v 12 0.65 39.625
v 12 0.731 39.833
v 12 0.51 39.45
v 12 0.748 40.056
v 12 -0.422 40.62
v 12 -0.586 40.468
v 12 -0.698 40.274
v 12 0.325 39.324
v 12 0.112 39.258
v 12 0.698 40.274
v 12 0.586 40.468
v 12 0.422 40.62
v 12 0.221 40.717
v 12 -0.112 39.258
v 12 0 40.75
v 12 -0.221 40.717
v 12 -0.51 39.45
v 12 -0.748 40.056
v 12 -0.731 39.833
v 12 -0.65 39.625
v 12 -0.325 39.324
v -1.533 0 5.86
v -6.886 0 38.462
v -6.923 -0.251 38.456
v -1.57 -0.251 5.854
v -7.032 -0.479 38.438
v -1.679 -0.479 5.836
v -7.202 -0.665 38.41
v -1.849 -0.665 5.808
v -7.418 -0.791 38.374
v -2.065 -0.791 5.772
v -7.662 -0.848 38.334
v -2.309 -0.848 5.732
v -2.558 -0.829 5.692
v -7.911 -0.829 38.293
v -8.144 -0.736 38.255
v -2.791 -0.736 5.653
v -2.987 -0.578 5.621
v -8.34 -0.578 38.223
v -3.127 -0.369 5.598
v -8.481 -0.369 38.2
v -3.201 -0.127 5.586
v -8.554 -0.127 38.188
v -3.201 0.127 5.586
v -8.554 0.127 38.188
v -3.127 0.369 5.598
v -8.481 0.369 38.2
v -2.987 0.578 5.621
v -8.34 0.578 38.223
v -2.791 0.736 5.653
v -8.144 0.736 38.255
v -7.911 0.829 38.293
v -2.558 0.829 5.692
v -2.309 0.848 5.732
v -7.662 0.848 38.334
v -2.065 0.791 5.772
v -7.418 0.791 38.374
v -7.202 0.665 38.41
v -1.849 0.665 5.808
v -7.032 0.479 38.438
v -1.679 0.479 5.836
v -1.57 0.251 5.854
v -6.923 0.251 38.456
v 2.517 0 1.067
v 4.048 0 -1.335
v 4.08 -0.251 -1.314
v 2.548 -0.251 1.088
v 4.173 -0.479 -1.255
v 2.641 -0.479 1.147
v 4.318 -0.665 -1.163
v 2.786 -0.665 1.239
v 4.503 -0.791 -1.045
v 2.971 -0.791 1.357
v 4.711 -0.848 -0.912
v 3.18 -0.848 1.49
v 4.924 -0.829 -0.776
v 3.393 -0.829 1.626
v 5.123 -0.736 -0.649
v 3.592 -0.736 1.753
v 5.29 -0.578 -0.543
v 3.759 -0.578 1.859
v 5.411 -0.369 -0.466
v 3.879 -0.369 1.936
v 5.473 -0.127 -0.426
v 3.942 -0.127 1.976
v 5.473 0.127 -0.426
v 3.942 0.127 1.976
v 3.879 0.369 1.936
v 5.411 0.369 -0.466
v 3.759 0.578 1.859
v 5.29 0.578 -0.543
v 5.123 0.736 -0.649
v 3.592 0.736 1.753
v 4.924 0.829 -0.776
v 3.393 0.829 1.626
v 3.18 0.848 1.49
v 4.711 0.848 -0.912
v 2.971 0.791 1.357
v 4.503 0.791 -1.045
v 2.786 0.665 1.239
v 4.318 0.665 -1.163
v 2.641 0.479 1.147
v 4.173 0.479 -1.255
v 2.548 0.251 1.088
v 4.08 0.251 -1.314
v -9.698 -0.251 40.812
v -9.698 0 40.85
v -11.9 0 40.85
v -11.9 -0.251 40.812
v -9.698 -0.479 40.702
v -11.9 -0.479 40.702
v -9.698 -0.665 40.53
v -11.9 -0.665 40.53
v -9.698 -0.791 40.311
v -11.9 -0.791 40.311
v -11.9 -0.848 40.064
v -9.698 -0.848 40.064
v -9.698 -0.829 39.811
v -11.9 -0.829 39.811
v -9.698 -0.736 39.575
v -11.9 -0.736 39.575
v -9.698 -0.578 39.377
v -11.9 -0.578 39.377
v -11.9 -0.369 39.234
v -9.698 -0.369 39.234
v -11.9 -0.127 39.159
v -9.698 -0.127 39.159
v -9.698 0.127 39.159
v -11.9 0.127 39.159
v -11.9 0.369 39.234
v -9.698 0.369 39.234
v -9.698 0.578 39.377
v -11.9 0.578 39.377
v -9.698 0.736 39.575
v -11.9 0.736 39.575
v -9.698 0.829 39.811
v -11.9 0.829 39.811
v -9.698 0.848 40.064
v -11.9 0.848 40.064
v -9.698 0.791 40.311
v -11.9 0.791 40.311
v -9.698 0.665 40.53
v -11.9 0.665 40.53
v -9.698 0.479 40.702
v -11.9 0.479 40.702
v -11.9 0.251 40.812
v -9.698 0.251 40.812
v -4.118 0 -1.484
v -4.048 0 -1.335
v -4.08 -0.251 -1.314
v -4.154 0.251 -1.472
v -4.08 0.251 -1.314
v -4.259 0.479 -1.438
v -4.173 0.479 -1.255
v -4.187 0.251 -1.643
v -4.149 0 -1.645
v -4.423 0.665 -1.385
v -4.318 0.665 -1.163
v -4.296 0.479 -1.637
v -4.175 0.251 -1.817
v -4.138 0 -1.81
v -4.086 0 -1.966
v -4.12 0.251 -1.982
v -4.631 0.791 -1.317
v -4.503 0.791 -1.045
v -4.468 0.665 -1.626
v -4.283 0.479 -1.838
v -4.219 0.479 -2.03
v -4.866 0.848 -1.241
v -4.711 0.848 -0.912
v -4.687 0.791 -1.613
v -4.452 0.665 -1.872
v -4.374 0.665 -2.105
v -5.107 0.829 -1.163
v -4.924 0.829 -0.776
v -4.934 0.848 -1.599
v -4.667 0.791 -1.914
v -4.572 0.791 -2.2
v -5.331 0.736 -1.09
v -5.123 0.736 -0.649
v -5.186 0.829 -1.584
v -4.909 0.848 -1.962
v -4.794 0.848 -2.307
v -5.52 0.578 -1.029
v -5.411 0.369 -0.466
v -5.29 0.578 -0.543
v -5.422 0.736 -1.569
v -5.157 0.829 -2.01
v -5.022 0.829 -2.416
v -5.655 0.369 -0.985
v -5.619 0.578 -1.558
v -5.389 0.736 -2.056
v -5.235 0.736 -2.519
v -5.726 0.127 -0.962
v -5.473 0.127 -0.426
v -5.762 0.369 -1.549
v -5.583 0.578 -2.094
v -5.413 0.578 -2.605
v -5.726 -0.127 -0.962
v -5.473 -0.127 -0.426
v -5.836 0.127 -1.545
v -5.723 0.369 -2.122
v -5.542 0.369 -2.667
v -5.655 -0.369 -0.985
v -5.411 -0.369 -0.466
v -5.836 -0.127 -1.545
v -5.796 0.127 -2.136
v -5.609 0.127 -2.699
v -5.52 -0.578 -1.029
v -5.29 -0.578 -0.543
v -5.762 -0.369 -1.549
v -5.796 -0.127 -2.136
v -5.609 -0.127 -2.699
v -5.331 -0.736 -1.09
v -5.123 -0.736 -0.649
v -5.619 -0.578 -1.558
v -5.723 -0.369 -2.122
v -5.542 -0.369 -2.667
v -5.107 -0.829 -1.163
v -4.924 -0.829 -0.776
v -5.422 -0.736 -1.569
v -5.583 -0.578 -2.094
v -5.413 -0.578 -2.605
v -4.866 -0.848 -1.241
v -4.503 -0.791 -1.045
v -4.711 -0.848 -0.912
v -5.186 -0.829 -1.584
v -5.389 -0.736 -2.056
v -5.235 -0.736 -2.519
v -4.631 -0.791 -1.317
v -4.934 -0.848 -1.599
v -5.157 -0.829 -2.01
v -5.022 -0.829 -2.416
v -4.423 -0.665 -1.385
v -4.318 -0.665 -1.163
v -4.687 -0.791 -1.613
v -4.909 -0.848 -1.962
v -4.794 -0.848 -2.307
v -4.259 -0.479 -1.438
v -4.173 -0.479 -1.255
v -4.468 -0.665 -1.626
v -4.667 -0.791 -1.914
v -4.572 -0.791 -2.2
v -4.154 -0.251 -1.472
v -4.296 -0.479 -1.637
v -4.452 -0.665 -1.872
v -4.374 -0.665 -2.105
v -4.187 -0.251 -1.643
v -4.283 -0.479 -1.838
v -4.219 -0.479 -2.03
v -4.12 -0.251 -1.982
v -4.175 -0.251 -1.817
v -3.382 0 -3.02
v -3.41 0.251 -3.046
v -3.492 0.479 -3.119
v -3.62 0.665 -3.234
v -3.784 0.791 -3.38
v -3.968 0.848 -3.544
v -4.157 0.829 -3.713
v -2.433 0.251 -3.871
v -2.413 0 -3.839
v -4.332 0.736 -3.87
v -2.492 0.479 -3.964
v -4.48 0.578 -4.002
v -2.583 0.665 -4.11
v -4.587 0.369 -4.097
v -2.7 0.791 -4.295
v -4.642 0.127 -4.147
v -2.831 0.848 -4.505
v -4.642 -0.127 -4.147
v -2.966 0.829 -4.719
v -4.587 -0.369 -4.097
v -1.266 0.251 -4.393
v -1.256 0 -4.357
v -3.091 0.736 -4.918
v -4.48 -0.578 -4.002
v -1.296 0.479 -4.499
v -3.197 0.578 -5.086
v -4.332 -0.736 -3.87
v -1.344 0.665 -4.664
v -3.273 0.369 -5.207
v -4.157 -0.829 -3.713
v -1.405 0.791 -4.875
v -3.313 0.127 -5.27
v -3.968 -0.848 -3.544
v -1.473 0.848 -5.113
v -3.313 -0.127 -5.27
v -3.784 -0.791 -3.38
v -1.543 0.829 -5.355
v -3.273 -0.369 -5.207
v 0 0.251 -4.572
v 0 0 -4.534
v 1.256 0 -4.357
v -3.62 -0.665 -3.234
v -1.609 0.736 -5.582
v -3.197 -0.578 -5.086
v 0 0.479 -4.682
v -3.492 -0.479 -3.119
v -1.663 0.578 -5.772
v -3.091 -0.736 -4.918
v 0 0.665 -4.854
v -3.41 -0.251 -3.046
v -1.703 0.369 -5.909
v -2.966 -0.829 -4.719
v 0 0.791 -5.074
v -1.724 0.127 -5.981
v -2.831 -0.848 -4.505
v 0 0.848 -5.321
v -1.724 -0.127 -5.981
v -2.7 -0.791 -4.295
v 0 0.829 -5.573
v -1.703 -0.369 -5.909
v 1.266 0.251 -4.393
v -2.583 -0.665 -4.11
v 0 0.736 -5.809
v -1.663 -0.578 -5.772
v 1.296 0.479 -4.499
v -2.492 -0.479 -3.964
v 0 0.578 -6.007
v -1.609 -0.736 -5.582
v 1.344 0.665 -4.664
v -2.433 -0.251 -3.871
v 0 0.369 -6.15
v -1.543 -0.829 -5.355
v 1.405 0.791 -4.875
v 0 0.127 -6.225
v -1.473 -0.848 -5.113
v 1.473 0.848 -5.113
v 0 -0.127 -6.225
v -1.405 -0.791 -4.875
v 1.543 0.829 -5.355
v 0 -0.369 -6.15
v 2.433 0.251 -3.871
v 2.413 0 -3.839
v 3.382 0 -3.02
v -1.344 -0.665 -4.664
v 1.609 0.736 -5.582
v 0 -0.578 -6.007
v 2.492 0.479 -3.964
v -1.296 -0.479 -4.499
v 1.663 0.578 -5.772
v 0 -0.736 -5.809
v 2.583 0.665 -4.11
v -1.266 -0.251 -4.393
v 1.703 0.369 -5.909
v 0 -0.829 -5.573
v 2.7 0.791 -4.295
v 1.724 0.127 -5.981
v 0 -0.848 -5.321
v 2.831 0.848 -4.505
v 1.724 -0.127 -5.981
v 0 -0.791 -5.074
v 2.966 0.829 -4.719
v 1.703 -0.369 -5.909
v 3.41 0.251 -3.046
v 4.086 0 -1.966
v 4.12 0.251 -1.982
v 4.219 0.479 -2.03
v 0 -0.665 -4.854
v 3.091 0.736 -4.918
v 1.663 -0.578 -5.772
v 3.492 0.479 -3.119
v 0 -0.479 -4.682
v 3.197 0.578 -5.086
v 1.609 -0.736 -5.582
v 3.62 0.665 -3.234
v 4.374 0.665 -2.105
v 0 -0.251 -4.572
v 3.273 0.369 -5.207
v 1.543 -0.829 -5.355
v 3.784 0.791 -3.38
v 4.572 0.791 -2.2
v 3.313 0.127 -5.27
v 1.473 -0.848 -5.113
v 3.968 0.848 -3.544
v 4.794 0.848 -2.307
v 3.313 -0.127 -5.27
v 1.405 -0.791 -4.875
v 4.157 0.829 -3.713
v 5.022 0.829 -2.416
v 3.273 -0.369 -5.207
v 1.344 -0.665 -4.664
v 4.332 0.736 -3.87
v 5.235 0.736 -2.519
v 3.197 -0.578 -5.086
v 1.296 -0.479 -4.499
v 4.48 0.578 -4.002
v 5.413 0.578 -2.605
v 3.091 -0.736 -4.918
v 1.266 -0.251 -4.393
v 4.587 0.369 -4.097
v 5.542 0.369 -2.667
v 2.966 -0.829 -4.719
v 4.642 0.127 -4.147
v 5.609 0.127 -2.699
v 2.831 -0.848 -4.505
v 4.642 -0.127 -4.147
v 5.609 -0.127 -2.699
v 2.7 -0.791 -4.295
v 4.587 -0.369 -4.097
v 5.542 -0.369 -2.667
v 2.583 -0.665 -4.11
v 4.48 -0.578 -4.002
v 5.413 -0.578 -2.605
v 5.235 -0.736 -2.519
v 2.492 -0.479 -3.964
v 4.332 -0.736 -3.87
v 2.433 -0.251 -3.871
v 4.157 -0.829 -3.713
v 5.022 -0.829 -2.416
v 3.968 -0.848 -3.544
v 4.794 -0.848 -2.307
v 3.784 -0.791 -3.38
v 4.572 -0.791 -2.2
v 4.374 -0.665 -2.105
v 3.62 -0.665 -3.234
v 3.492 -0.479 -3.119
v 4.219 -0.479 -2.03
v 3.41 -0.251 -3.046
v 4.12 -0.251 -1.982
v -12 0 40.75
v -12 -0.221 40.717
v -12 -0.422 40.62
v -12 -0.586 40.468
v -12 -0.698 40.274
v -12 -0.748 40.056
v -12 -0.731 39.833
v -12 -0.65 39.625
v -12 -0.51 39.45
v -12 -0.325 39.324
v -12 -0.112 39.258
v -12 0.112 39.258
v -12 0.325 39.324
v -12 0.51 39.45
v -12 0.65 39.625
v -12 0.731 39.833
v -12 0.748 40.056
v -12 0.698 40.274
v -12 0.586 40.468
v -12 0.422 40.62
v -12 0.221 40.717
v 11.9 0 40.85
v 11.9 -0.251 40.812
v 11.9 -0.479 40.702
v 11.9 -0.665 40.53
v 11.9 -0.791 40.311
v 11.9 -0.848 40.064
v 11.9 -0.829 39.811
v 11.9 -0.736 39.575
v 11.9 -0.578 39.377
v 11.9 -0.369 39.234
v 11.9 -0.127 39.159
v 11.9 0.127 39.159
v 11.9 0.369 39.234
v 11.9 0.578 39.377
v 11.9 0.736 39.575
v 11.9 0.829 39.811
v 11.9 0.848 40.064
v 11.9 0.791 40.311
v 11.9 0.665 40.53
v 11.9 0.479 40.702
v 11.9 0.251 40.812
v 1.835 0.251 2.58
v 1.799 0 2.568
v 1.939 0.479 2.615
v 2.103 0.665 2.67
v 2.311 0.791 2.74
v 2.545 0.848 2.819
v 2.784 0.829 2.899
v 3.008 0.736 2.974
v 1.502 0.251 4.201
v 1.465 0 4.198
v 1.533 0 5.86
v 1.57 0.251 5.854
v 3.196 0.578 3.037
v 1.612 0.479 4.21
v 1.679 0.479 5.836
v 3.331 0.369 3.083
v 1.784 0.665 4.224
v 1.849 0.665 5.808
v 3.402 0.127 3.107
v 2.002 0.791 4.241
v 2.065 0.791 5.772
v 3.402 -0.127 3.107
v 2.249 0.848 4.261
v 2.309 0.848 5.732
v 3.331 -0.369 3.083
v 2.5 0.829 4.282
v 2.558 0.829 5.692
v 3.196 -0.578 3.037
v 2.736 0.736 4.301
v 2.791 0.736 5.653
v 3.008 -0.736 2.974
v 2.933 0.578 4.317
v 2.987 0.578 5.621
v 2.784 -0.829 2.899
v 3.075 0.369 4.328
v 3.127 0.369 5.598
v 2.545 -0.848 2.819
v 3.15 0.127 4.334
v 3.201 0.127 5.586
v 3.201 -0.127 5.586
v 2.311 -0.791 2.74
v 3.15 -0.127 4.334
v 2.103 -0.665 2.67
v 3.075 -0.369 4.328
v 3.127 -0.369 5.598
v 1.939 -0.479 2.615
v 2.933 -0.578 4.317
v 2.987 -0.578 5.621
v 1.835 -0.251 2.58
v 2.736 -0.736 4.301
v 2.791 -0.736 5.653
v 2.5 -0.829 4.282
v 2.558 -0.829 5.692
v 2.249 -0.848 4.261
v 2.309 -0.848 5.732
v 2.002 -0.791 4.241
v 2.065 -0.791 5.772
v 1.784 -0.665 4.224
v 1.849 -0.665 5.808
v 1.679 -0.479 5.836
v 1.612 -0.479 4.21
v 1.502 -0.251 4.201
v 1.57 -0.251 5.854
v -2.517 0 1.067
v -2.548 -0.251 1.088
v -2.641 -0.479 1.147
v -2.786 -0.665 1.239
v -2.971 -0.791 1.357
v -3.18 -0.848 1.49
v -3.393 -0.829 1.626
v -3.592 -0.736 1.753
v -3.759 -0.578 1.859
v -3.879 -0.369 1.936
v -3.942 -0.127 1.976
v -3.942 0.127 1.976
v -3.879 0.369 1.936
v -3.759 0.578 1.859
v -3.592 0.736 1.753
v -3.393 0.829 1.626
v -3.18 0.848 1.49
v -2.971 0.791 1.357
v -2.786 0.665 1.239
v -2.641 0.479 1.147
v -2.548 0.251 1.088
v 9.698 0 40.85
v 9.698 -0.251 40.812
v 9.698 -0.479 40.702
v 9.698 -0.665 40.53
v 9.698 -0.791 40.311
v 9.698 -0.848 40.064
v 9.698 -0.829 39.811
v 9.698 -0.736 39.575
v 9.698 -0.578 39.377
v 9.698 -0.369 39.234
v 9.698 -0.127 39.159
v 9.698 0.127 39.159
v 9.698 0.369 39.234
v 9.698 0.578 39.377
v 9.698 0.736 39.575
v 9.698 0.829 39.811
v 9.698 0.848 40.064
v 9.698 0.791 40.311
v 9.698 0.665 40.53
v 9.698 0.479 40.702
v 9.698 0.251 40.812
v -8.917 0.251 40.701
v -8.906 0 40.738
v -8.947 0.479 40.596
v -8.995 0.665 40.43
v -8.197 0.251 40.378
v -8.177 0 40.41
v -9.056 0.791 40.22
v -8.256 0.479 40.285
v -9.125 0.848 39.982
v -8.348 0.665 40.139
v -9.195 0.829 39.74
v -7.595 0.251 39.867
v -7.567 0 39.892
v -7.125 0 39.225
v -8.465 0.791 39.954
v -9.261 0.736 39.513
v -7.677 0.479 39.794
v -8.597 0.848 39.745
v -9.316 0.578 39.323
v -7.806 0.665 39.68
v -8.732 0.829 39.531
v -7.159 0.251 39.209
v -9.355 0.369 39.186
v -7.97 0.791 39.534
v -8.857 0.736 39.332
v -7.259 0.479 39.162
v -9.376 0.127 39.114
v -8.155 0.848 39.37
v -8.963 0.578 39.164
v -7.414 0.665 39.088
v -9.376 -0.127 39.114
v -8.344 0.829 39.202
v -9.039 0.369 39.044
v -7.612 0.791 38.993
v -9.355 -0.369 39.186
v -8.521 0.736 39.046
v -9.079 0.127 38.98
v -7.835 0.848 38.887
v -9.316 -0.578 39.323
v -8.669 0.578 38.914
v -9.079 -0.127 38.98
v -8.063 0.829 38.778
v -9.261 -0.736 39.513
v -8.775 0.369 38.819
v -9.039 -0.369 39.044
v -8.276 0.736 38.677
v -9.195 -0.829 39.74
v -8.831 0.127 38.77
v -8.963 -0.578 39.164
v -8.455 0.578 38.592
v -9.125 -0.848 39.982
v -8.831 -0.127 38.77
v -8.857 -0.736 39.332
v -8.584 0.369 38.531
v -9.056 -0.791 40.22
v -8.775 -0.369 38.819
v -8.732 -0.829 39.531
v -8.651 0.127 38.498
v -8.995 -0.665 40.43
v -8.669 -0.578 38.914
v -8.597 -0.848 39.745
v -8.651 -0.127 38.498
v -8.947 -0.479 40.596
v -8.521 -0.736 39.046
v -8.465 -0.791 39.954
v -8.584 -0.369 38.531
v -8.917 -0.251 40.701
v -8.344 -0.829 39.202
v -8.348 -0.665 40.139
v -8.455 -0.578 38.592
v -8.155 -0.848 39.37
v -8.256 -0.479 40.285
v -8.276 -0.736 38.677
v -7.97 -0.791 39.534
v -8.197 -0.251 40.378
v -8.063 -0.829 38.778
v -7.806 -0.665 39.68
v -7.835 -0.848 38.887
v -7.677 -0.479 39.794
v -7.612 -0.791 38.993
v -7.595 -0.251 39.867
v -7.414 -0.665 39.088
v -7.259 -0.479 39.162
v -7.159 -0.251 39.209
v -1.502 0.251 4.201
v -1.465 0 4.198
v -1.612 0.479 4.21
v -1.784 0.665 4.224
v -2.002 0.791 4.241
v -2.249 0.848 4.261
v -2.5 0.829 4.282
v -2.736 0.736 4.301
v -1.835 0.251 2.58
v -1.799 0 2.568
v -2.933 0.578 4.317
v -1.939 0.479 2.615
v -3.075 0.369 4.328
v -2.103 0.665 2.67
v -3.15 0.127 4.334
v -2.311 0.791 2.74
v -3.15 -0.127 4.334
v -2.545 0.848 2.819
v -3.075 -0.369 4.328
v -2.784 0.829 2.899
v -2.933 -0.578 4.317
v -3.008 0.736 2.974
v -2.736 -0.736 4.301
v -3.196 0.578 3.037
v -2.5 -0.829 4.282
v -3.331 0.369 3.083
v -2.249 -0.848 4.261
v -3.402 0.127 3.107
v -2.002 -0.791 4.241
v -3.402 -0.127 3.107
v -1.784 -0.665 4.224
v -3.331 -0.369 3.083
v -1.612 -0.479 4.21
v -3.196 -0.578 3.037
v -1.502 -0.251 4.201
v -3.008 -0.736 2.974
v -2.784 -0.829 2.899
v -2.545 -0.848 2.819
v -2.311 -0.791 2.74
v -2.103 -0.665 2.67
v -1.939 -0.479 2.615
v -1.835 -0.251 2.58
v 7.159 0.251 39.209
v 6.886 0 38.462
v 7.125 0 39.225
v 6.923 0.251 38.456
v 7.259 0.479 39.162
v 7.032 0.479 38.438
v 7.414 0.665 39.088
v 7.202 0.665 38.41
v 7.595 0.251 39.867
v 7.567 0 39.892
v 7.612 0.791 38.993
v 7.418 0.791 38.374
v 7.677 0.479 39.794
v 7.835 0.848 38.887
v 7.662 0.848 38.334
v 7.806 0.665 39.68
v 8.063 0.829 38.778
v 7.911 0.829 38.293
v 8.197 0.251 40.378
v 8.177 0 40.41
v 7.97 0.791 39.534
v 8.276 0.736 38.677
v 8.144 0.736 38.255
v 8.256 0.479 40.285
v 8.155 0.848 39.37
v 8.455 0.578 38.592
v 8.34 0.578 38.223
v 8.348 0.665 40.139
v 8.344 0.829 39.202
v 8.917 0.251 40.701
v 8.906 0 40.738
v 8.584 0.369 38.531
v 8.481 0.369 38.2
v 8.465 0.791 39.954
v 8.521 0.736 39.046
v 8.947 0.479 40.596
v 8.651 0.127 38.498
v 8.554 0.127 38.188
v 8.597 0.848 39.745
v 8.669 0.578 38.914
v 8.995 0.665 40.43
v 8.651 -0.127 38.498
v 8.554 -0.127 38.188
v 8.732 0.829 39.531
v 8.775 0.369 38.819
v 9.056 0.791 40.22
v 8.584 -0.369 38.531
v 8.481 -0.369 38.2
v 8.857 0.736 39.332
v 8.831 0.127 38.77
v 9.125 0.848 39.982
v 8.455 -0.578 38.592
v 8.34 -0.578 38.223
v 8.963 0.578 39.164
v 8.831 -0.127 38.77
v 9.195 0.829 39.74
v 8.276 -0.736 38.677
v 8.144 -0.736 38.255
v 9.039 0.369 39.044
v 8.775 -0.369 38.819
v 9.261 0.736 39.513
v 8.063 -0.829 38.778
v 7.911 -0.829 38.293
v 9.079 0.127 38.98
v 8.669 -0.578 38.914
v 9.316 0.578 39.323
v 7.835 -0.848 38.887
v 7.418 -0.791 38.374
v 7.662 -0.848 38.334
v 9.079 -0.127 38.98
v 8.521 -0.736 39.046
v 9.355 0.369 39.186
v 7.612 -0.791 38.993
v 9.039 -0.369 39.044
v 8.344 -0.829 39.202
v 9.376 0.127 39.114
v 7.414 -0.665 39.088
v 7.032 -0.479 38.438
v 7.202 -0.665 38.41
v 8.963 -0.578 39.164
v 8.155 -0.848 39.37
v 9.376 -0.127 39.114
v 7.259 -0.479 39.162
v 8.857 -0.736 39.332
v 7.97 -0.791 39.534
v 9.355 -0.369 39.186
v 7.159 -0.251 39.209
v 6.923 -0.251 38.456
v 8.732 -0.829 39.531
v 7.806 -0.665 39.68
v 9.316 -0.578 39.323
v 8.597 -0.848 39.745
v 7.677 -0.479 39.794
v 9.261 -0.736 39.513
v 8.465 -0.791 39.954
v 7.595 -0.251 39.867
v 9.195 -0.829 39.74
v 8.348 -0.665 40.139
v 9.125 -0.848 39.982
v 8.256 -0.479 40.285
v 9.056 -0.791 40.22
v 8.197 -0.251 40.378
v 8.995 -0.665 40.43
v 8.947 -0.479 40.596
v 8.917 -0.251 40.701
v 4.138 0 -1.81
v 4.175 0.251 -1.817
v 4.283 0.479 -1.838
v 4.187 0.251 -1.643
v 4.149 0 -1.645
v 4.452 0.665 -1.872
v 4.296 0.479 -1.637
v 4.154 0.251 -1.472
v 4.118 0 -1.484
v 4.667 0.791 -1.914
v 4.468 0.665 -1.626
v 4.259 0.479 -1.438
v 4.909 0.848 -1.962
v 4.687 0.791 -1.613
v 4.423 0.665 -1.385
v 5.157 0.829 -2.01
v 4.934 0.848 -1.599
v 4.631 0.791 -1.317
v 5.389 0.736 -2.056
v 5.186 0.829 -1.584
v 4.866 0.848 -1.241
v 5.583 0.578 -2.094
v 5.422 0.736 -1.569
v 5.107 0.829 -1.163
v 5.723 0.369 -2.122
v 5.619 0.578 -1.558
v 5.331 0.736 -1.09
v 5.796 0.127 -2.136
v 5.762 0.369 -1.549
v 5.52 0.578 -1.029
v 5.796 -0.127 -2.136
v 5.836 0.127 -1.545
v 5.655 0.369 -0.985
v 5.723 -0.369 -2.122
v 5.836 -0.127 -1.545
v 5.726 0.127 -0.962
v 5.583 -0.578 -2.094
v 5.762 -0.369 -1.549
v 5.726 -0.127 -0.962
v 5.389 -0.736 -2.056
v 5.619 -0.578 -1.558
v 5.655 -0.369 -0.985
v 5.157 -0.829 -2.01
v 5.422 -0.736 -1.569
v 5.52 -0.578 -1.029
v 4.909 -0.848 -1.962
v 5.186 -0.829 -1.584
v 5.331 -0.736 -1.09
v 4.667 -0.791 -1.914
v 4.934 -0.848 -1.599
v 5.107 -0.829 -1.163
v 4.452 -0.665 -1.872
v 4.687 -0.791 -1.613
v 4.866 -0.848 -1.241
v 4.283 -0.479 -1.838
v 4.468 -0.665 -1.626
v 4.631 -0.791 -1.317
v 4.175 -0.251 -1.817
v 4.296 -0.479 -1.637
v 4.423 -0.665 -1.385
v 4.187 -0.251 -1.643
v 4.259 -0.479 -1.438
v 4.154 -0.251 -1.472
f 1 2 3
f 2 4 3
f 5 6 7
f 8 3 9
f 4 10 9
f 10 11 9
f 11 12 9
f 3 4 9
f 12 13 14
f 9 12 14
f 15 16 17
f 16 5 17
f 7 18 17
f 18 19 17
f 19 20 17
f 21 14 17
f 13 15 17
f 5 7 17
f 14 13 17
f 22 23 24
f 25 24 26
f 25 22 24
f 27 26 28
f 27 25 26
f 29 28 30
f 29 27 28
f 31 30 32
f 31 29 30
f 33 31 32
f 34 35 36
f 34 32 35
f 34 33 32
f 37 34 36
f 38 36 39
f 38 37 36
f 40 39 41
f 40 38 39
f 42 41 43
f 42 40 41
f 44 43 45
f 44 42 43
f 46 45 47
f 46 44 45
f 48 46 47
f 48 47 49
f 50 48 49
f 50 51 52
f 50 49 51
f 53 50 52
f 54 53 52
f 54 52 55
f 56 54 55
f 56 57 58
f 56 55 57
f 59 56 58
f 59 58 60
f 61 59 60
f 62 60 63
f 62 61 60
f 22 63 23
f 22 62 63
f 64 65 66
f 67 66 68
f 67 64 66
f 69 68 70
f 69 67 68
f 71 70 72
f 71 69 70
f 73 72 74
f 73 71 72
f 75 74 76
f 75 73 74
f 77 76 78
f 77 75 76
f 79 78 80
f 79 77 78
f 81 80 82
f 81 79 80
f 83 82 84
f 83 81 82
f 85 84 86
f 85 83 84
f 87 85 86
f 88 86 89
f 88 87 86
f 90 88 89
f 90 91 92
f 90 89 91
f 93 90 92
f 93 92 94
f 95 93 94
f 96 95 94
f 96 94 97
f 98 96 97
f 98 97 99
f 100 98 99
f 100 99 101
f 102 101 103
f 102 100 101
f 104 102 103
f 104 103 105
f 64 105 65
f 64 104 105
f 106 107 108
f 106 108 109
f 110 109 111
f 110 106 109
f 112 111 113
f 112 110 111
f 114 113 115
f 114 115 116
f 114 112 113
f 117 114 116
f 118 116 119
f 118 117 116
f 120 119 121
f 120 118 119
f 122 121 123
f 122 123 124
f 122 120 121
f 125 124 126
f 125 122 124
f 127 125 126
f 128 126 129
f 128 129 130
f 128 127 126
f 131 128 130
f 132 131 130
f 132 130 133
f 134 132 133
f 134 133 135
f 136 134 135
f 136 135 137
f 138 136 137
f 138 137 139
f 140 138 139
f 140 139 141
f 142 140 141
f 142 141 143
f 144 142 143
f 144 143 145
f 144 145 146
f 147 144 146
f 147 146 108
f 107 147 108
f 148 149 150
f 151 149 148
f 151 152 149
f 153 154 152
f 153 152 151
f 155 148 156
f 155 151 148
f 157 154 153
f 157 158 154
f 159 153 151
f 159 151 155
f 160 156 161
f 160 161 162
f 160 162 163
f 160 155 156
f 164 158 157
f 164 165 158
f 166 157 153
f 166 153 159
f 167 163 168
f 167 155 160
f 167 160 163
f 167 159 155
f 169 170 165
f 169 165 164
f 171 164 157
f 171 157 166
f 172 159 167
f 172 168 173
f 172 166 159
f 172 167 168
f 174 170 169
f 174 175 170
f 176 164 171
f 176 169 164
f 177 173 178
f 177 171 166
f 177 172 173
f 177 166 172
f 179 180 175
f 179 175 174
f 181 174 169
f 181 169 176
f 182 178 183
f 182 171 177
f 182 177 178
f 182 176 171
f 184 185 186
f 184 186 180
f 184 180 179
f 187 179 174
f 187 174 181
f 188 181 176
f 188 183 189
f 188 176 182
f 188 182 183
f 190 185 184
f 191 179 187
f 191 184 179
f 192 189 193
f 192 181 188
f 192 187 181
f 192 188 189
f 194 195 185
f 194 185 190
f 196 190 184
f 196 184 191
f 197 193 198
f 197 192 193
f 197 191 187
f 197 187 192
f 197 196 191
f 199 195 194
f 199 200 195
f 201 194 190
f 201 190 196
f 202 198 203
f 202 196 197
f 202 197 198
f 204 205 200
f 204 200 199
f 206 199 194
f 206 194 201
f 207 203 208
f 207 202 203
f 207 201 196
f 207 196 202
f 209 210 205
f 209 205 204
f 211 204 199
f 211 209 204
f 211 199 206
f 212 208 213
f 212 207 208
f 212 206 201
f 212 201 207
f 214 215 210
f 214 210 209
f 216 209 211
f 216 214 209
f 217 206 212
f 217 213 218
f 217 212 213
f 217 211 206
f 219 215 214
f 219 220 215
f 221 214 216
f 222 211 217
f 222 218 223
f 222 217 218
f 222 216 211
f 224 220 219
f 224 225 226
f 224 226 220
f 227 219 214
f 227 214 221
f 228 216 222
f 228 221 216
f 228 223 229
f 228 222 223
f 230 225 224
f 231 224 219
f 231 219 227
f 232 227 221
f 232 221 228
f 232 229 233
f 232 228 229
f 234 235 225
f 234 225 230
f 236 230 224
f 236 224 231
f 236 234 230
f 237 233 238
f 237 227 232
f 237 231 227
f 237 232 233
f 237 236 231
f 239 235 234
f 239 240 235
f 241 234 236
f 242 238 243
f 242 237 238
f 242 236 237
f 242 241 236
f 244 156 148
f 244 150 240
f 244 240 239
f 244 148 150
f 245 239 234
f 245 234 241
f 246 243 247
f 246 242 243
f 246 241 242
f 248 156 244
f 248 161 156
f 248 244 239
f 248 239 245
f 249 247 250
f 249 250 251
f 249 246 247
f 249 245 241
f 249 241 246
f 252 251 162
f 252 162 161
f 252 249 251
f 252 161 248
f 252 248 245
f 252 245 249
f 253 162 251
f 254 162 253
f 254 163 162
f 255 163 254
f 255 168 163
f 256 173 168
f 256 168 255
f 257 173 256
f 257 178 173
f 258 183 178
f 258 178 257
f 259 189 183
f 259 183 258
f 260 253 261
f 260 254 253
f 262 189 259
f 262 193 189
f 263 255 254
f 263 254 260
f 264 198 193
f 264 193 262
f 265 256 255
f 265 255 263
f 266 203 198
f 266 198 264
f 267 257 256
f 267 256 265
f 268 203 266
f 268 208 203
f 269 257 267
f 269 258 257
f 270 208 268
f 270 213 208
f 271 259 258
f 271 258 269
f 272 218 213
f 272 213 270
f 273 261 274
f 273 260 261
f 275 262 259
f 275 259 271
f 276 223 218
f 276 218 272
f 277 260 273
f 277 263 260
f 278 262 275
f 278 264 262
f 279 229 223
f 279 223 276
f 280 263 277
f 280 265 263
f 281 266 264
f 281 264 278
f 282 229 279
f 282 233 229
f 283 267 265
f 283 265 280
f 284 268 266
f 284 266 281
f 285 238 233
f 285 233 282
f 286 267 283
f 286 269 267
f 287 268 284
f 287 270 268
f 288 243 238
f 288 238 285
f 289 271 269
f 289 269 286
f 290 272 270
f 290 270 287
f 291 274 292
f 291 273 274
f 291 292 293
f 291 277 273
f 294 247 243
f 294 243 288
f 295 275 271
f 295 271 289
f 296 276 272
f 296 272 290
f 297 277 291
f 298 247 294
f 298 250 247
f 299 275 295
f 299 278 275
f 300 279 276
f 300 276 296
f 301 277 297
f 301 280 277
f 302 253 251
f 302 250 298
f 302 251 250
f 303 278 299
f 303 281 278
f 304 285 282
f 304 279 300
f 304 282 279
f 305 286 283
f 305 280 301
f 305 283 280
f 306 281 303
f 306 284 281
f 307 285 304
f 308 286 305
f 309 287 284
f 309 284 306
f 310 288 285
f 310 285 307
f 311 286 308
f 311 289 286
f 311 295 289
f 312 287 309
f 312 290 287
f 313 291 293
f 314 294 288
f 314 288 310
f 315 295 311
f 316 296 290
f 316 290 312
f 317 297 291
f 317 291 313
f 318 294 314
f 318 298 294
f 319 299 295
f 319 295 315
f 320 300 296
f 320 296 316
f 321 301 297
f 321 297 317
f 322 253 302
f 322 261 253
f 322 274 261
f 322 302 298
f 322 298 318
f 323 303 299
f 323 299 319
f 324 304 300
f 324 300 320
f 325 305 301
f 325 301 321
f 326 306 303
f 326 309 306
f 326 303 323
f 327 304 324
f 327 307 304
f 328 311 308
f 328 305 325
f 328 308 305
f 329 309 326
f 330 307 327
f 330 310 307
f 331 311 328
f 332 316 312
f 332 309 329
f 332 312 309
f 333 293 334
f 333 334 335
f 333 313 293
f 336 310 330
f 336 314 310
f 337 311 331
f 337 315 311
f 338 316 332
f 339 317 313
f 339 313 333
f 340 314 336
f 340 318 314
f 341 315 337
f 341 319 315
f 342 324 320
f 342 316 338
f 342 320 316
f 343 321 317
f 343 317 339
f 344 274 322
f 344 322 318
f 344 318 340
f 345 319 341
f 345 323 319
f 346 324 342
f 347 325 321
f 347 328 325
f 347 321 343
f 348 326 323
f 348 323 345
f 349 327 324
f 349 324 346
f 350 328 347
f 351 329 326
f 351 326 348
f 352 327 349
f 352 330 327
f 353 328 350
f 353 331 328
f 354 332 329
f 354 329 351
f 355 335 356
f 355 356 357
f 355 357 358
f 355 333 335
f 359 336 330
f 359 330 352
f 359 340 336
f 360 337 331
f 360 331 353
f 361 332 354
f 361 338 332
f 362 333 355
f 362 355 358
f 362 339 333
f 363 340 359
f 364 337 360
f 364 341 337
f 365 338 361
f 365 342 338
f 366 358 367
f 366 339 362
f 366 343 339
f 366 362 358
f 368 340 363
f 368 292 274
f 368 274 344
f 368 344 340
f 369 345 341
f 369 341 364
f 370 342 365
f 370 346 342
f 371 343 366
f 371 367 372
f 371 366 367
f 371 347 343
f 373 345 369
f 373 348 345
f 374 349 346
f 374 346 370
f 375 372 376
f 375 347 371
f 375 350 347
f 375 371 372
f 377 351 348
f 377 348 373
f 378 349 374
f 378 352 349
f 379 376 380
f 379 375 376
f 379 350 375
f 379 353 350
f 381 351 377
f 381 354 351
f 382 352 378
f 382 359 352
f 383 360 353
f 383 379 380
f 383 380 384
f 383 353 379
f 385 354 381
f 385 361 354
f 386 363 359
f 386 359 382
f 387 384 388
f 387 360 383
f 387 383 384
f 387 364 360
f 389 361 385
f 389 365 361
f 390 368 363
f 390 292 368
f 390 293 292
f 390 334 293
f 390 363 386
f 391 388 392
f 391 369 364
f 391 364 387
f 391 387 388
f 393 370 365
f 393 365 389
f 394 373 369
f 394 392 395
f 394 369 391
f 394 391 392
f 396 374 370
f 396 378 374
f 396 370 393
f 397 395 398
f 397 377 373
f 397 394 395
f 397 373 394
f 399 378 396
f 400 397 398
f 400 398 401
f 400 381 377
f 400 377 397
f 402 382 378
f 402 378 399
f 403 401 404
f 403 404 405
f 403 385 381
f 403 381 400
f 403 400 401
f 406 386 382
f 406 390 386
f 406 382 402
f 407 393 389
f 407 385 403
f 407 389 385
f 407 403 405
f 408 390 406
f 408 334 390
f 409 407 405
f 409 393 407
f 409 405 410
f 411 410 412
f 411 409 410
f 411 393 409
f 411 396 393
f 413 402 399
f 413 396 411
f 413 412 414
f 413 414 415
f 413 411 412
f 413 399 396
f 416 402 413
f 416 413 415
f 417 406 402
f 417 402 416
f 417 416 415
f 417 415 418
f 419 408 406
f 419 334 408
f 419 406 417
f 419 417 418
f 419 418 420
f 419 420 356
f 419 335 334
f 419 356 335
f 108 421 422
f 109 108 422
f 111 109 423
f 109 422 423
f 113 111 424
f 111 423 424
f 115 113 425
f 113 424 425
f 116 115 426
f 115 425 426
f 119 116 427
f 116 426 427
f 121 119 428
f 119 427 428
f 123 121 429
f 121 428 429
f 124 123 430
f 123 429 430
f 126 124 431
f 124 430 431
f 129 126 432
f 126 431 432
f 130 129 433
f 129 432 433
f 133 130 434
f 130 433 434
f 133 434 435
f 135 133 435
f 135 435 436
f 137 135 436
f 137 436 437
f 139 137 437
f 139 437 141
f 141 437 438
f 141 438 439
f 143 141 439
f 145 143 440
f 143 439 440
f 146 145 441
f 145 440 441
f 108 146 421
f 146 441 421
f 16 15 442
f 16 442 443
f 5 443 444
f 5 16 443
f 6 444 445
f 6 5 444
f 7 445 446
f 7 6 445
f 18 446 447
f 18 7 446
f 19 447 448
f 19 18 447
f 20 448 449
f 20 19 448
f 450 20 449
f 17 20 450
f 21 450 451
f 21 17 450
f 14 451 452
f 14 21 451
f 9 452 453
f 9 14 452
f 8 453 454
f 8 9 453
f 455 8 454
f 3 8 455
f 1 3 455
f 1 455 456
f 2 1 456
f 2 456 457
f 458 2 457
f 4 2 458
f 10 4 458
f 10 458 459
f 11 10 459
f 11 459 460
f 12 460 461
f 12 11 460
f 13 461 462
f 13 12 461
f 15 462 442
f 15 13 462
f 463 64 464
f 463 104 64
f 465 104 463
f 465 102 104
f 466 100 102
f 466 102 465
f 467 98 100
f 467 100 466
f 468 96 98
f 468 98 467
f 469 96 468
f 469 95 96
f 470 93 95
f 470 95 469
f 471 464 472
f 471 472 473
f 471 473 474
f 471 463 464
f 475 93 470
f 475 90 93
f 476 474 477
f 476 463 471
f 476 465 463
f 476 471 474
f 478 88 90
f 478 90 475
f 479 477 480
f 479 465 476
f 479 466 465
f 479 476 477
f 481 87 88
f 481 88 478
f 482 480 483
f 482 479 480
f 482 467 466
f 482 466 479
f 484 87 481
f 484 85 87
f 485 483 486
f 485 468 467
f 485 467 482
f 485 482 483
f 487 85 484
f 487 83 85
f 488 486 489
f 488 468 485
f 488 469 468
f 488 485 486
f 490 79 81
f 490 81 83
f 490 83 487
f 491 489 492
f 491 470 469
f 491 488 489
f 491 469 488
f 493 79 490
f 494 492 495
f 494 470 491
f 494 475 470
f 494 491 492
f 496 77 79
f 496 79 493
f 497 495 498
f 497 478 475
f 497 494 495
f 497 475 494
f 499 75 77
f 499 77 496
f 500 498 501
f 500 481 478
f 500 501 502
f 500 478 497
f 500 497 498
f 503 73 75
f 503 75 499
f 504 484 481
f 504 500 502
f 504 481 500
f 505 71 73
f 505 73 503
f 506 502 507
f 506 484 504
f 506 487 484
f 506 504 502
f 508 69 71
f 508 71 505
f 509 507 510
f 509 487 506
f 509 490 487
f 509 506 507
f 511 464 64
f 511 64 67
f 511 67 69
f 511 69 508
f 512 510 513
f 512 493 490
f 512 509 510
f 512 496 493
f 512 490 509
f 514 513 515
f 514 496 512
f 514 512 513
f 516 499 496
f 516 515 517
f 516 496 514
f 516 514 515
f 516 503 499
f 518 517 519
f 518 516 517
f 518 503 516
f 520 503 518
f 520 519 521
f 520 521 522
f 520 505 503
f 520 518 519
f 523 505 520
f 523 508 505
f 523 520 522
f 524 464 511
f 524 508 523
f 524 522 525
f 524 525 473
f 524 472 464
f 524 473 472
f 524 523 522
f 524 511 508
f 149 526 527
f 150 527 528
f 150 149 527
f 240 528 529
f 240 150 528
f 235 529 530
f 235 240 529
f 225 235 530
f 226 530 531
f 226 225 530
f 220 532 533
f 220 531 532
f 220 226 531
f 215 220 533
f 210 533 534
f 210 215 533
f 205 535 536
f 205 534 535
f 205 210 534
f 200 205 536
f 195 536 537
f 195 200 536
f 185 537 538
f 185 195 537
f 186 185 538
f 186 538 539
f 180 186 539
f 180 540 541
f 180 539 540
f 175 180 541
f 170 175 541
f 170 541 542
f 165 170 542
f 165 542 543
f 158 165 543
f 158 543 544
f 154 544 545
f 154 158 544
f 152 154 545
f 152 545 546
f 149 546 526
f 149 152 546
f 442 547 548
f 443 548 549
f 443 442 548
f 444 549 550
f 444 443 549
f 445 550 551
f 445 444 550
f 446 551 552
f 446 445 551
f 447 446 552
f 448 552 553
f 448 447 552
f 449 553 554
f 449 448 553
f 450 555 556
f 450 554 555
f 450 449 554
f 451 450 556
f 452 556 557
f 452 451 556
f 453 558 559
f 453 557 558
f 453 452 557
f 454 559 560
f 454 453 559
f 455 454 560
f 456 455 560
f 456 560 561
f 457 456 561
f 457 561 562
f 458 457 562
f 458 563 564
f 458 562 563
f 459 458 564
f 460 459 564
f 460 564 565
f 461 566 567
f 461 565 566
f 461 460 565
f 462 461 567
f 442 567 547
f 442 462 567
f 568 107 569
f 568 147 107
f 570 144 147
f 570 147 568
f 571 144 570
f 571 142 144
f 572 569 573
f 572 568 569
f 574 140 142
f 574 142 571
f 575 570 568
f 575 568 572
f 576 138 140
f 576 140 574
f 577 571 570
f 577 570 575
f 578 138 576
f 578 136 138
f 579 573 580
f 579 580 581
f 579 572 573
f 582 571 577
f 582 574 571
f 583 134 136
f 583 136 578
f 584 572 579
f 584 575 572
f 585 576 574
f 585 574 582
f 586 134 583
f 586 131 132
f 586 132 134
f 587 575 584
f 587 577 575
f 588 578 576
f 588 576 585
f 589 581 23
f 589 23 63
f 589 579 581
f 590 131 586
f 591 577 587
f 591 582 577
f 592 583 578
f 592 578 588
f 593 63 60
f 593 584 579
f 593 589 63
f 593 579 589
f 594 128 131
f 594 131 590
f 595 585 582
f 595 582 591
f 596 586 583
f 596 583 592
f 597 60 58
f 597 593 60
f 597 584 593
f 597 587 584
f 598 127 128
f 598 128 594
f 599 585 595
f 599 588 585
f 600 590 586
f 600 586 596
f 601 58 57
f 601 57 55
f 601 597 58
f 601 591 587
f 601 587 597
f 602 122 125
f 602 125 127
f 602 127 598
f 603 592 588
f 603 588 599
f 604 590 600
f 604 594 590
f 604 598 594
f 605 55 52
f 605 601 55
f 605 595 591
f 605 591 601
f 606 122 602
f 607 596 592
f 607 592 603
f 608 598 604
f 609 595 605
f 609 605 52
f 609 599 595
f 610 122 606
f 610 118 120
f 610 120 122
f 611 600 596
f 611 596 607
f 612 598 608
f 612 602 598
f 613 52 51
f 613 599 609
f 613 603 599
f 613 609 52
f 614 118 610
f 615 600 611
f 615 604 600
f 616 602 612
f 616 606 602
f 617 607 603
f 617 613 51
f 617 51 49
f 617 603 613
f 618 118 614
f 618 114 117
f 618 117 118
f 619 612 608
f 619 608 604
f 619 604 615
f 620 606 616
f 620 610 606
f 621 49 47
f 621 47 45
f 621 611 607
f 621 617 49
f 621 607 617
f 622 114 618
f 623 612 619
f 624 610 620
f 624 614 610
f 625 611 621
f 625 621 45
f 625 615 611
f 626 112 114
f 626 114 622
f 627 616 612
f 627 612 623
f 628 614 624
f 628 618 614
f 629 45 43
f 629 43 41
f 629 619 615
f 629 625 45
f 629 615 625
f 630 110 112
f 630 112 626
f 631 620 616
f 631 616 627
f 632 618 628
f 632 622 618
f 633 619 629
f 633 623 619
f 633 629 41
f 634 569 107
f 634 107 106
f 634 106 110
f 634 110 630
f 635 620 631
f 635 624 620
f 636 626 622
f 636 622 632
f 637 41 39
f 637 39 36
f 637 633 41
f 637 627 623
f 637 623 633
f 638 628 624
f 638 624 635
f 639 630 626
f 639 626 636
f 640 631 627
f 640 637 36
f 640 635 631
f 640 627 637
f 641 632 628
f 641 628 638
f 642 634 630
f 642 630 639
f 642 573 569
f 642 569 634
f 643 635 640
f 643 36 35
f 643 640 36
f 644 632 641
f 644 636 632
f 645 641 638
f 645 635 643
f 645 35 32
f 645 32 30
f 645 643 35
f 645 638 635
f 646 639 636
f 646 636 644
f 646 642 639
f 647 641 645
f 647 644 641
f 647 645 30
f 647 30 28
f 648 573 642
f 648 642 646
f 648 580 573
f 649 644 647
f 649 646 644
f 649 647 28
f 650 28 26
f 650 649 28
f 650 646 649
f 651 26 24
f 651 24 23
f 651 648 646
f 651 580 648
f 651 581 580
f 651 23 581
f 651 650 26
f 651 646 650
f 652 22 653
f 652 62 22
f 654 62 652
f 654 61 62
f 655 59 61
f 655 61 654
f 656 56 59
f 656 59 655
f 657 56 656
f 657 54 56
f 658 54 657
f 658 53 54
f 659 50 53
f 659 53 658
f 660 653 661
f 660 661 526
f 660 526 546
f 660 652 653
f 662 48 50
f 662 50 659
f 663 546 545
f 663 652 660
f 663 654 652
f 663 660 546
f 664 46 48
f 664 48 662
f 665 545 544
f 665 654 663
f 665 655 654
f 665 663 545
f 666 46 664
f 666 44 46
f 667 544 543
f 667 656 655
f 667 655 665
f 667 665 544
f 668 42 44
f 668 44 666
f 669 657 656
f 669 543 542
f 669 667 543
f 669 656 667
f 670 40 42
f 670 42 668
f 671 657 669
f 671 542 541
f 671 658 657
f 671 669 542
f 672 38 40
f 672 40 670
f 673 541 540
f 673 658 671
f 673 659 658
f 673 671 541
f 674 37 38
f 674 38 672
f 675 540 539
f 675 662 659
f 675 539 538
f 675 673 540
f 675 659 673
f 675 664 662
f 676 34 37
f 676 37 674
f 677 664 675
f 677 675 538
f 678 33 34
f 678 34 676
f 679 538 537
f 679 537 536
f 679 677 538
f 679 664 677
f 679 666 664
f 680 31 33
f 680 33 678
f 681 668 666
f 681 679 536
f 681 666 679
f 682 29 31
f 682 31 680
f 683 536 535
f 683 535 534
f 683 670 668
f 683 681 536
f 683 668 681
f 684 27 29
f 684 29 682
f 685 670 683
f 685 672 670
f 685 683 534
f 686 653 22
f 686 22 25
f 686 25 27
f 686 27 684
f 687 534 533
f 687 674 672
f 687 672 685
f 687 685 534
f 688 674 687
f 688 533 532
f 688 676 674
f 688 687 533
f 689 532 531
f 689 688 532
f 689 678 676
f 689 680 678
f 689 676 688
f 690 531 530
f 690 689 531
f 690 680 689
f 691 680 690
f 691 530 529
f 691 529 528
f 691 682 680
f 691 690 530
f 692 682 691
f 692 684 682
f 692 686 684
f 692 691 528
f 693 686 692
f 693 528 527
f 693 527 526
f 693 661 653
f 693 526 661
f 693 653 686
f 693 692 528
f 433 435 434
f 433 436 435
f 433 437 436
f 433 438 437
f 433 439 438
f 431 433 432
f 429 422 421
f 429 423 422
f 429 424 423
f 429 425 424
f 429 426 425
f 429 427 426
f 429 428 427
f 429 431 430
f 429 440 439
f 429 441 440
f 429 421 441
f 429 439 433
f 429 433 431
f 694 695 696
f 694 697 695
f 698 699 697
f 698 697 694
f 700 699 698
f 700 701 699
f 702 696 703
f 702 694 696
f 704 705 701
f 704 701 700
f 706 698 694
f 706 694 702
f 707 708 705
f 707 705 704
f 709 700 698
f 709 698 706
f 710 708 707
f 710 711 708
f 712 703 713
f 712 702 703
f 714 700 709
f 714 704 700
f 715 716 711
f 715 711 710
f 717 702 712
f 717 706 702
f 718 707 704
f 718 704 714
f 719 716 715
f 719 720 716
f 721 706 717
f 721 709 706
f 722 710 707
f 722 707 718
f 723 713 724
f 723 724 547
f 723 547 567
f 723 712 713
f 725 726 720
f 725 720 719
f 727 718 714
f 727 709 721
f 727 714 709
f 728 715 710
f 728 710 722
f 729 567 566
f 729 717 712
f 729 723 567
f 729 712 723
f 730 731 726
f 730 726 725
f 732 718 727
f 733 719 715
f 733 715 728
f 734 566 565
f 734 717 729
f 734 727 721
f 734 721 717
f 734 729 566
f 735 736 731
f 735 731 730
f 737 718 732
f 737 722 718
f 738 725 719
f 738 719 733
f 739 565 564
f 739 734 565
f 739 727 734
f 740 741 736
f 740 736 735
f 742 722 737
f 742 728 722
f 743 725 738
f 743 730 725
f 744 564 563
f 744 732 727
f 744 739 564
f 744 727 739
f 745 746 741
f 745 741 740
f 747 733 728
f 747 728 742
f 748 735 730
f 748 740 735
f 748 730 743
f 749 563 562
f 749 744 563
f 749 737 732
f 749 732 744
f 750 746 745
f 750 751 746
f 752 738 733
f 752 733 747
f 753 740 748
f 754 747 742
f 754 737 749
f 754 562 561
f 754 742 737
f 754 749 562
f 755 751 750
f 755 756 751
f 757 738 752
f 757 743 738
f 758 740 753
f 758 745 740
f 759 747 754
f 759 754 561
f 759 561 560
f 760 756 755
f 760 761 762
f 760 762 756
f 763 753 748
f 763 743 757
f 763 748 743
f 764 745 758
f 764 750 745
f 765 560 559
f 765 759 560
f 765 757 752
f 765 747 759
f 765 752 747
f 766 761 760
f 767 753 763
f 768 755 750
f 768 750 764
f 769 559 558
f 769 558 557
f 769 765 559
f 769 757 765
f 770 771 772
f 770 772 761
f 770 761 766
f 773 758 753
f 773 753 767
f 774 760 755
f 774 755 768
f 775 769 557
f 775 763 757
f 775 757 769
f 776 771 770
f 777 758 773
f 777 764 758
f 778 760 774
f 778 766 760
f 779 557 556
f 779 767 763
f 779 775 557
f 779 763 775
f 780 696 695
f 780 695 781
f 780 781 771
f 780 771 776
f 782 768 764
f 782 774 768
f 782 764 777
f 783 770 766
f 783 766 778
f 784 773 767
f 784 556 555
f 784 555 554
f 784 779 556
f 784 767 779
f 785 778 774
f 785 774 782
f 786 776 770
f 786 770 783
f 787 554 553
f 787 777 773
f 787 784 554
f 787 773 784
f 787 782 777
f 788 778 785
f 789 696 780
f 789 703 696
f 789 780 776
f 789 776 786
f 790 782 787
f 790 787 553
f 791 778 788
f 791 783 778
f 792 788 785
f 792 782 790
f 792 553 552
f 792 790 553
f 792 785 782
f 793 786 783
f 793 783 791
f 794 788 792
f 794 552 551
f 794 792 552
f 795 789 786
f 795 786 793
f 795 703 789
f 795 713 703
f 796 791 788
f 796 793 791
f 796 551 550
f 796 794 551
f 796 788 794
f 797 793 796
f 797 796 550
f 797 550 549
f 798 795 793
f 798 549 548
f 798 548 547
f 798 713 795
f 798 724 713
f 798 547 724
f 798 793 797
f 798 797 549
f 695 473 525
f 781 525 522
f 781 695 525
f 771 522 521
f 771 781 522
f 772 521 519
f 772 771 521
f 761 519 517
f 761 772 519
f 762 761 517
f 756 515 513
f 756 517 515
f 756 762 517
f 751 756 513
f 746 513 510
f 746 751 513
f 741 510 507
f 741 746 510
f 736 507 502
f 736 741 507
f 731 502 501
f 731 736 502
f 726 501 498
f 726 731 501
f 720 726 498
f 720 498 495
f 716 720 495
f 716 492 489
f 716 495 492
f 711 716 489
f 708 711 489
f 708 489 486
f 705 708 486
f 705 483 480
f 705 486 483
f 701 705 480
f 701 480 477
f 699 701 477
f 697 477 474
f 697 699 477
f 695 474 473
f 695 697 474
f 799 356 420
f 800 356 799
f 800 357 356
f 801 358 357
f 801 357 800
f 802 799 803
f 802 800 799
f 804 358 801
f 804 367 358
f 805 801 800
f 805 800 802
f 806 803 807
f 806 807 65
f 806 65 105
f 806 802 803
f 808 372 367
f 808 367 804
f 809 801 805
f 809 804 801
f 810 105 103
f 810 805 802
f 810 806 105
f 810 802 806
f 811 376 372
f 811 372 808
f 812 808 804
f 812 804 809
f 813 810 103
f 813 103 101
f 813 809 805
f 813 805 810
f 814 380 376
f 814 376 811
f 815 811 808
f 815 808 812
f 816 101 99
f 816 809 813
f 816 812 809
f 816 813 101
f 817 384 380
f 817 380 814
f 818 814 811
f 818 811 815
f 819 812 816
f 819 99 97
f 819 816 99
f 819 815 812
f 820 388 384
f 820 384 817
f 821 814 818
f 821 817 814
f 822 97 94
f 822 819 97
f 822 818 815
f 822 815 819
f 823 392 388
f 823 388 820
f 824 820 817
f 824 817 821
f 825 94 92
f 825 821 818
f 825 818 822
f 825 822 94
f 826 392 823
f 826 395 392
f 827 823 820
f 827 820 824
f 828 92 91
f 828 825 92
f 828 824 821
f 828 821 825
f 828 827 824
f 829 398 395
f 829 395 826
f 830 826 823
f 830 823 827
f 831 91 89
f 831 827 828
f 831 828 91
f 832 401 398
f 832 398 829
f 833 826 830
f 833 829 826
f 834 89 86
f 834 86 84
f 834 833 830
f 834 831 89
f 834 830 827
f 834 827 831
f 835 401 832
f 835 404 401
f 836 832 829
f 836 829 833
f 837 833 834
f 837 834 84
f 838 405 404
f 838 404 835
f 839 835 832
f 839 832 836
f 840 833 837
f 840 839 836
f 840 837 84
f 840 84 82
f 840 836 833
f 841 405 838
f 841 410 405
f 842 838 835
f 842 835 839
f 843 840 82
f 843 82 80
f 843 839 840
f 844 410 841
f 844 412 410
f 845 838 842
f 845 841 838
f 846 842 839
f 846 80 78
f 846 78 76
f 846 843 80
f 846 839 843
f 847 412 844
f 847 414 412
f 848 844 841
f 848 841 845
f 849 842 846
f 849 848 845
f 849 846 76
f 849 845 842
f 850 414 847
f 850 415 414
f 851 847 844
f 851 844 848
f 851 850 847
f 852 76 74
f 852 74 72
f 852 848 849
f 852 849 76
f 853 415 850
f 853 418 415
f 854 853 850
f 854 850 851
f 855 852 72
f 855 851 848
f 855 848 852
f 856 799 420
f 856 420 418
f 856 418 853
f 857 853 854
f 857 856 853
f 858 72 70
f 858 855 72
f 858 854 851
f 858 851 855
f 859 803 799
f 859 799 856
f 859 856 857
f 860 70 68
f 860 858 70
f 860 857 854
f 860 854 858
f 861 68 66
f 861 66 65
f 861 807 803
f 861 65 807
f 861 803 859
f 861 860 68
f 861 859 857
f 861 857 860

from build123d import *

# Parameters (mm, degrees)
SKETCH2_R     = 0.85
CHAMFER1_SIZE = 0.1


with BuildPart() as part:
    # Sweep2: sweep along a path in Sketch1
    with BuildLine(Plane(origin=(0, 0, 0), x_dir=(1, 0, 0), z_dir=(0, 1, 0))) as sweep2_path:
        Line((-12, -40), (-9.698387528, -40))
        ThreePointArc((-9.698387528, -40), (-8.403804383, -39.524484988), (-7.724814957, -38.324054479))
        Line((-7.724814957, -38.324054479), (-2.371685824, -5.722163438))
        ThreePointArc((-2.371685824, -5.722163438), (-2.41492462, -3.543666064), (-3.233291931, -1.524261364))
        Line((-3.233291931, -1.524261364), (-4.764777902, 0.87765625))
        ThreePointArc((-4.764777902, 0.87765625), (-4.997339075, 1.594784166), (-4.851667642, 2.334471248))
        ThreePointArc((-4.851667642, 2.334471248), (0, 5.384090909), (4.851667642, 2.334471248))
        ThreePointArc((4.851667642, 2.334471248), (4.997339075, 1.594784166), (4.764777902, 0.87765625))
        Line((4.764777902, 0.87765625), (3.233291931, -1.524261364))
        ThreePointArc((3.233291931, -1.524261364), (2.41492462, -3.543666064), (2.371685824, -5.722163438))
        Line((2.371685824, -5.722163438), (7.724814957, -38.324054479))
        ThreePointArc((7.724814957, -38.324054479), (8.403804383, -39.524484988), (9.698387528, -40))
        Line((9.698387528, -40), (12, -40))
    # Sketch2 → Sweep2 (sweep)
    with BuildSketch(Plane(origin=(-12, 0, 40), x_dir=(0, 0, 1), z_dir=(-1, 0, 0))):
        Circle(SKETCH2_R)
    sweep(path=sweep2_path.line)

    # Chamfer1
    chamfer1_edges = [part.edges().sort_by_distance(p)[0] for p in [
        (12, 0, 39.15),
        (-12, 0, 39.15),
    ]]
    chamfer(chamfer1_edges, length=CHAMFER1_SIZE)


solid = part.part
